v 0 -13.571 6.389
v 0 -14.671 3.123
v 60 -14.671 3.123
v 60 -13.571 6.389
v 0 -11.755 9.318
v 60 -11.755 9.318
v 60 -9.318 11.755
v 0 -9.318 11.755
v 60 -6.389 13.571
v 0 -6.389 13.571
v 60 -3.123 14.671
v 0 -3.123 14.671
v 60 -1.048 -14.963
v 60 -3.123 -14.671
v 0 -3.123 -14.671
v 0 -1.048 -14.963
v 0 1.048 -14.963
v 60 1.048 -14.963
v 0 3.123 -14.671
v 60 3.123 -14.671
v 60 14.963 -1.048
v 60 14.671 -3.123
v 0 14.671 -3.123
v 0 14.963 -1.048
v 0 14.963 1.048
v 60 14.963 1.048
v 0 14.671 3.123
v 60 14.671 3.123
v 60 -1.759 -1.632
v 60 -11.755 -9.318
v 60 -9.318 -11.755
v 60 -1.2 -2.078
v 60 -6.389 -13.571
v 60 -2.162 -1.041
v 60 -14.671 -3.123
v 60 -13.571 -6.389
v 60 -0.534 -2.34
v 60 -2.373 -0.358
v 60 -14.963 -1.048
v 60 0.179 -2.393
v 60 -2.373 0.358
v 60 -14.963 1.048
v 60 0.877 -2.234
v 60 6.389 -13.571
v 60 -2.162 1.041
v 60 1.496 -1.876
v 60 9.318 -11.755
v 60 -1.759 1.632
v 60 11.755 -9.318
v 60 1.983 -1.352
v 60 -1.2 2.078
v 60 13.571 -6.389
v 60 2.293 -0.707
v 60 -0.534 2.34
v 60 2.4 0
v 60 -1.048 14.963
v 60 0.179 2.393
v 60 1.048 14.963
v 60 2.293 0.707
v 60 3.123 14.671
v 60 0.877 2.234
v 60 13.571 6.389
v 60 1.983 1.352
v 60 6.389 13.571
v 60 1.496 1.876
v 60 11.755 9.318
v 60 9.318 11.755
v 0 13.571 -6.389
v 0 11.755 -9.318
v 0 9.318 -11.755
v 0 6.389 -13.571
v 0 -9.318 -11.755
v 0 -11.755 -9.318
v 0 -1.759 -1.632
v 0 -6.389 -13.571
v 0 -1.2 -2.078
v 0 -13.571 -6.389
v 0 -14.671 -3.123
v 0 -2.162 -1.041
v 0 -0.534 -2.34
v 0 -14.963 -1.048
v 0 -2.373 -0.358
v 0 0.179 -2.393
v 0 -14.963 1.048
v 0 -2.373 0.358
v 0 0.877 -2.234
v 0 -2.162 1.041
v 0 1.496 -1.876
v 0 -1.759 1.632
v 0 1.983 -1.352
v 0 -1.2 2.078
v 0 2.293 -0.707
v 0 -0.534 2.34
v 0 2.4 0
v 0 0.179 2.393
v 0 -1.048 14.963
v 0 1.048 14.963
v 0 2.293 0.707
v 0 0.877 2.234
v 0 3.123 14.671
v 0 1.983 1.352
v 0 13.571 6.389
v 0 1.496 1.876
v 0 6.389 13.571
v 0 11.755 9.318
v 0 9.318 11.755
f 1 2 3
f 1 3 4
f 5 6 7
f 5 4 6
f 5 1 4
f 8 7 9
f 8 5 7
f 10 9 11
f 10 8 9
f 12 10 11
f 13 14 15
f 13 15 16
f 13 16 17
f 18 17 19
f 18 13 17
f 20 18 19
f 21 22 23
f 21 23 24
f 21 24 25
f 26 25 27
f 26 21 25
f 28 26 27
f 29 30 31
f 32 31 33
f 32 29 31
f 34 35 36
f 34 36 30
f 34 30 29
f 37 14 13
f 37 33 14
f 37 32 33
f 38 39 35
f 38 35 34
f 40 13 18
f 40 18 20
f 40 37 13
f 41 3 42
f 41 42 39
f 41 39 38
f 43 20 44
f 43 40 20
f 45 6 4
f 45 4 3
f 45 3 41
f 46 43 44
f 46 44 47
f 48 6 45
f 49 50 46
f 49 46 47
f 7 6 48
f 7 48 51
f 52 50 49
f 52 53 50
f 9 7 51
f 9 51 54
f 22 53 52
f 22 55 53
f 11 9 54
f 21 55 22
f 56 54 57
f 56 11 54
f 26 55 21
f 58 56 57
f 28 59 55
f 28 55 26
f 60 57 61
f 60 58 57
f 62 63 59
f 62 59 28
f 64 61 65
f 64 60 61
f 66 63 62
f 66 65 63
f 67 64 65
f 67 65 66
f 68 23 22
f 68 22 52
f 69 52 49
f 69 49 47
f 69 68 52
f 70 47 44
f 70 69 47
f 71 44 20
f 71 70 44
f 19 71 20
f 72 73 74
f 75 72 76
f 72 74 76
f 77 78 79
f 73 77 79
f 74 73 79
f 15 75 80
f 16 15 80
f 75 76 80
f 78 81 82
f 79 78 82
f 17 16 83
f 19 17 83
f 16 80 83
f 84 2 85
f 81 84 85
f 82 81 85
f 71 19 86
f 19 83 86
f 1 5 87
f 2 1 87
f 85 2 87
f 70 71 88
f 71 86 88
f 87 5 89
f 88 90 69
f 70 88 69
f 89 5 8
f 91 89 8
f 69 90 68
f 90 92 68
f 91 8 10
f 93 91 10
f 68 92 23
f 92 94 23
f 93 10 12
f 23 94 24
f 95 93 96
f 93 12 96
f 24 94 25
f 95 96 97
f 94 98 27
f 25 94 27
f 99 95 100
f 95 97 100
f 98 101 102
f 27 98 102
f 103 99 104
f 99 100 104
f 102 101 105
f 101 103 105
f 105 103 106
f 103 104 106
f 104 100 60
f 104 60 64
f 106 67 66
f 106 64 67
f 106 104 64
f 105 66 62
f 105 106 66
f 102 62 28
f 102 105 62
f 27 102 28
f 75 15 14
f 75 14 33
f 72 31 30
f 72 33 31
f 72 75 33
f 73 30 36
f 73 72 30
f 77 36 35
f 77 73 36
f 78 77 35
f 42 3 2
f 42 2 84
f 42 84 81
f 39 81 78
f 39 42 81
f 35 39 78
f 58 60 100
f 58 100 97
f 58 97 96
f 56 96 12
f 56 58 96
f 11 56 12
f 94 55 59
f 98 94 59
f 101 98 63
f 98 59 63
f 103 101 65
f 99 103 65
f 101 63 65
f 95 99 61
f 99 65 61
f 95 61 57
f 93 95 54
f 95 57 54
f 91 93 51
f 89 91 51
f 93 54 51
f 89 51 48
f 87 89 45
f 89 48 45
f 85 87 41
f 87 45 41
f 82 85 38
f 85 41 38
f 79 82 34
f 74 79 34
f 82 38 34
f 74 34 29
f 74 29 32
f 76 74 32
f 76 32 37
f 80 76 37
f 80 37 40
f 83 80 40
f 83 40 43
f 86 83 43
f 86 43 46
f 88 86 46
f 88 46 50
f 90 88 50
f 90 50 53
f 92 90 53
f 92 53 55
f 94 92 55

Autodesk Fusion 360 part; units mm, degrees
sketch "Sketch1" plane through (0, 0, 0) normal (1, 0, 0) x (0, 1, 0)
  circle A0 centre (0, 0) radius 15
  line L0 (6.3897, -13.8986) -> (5.9544, -13.7676)
  line L1 (0, 15) -> (0, 23)
  line L2 (0, 15) -> (-3, 15)
  line L3 (0, 15) -> (3, 15)
  line L4 (0, 23) -> (3, 15)
  line L5 (0, 23) -> (-3, 15)
  line L6 (-3, 15) -> (-3.1925, 14.4866)
  line L7 (3, 15) -> (3.1794, 14.5216)
  circle A1 centre (0, 0) radius 15
  circle A2 centre (0, 0) radius 15
  line L8 (-23, 0) -> (-15, -3)
  line L9 (-23, 0) -> (-15, 3)
  line L10 (-15, 3) -> (-14.5216, 3.1794)
  line L11 (-15, -3) -> (-14.4866, -3.1925)
  circle A3 centre (0, 0) radius 15
  line L12 (0, -23) -> (3, -15)
  line L13 (0, -23) -> (-3, -15)
  line L14 (-3, -15) -> (-3.1794, -14.5216)
  line L15 (3, -15) -> (3.1925, -14.4866)
  circle A4 centre (0, 0) radius 15
  line L16 (23, 0) -> (15, 3)
  line L17 (23, 0) -> (15, -3)
  line L18 (15, -3) -> (14.5216, -3.1794)
  line L19 (15, 3) -> (14.4866, 3.1925)
  circle A5 centre (0, 0) radius 15
  dimension "d1" = 30
  dimension "d16" = 8
  dimension "d17" = 3
  dimension "d18" = 3
  dimension "d31" = 360
extrude "Extrude9" add sketch "Sketch1" along normal blind 60
sketch "Sketch8" plane through (60, 0, 0) normal (1, 0, 0) x (0, 1, 0)
  line L0 (23, 0) -> (14.6712, 3.1233)
  arc A0 (14.6712, 3.1233) -> (3.1233, 14.6712) centre (0, 0) ccw
  line L1 (3.1233, 14.6712) -> (0, 23)
  line L2 (0, 23) -> (-3.1233, 14.6712)
  arc A1 (-3.1233, 14.6712) -> (-14.6712, 3.1233) centre (0, 0) ccw
  line L3 (-14.6712, 3.1233) -> (-23, 0)
  line L4 (-23, 0) -> (-14.6712, -3.1233)
  arc A2 (-14.6712, -3.1233) -> (-3.1233, -14.6712) centre (0, 0) ccw
  line L5 (-3.1233, -14.6712) -> (0, -23)
  line L6 (0, -23) -> (3.1233, -14.6712)
  arc A3 (3.1233, -14.6712) -> (14.6712, -3.1233) centre (0, 0) ccw
  line L7 (14.6712, -3.1233) -> (23, 0)
  circle A4 centre (0, 0) radius 2.4
  dimension "d34" = 4.8
extrude "Extrude10" cut sketch "Sketch8" against normal blind 85 contours A4
sketch "Sketch9" plane through (60, 0, 0) normal (1, 0, 0) x (0, 1, 0)
  circle A0 centre (0, 0) radius 2.4
  line L0 (23, 0) -> (14.6712, 3.1233)
  arc A1 (14.6712, 3.1233) -> (3.1233, 14.6712) centre (0, 0) ccw
  line L1 (3.1233, 14.6712) -> (0, 23)
  line L2 (0, 23) -> (-3.1233, 14.6712)
  arc A2 (-3.1233, 14.6712) -> (-14.6712, 3.1233) centre (0, 0) ccw
  line L3 (-14.6712, 3.1233) -> (-23, 0)
  line L4 (-23, 0) -> (-14.6712, -3.1233)
  arc A3 (-14.6712, -3.1233) -> (-3.1233, -14.6712) centre (0, 0) ccw
  line L5 (-3.1233, -14.6712) -> (0, -23)
  line L6 (0, -23) -> (3.1233, -14.6712)
  arc A4 (3.1233, -14.6712) -> (14.6712, -3.1233) centre (0, 0) ccw
  line L7 (14.6712, -3.1233) -> (23, 0)
  circle A5 centre (0, 0) radius 23
  circle A6 centre (0, 0) radius 15
extrude "Extrude11" cut sketch "Sketch9" against normal blind 75 contours L0 L7 A6 | L1 L2 A6 | L5 L6 A6 | L3 L4 A6
sketch "Sketch10" plane through (0, 0, 0) normal (1, 0, 0) x (0, 1, 0)
  circle A0 centre (0, 0) radius 23
  circle A1 centre (0, 0) radius 15.0333
